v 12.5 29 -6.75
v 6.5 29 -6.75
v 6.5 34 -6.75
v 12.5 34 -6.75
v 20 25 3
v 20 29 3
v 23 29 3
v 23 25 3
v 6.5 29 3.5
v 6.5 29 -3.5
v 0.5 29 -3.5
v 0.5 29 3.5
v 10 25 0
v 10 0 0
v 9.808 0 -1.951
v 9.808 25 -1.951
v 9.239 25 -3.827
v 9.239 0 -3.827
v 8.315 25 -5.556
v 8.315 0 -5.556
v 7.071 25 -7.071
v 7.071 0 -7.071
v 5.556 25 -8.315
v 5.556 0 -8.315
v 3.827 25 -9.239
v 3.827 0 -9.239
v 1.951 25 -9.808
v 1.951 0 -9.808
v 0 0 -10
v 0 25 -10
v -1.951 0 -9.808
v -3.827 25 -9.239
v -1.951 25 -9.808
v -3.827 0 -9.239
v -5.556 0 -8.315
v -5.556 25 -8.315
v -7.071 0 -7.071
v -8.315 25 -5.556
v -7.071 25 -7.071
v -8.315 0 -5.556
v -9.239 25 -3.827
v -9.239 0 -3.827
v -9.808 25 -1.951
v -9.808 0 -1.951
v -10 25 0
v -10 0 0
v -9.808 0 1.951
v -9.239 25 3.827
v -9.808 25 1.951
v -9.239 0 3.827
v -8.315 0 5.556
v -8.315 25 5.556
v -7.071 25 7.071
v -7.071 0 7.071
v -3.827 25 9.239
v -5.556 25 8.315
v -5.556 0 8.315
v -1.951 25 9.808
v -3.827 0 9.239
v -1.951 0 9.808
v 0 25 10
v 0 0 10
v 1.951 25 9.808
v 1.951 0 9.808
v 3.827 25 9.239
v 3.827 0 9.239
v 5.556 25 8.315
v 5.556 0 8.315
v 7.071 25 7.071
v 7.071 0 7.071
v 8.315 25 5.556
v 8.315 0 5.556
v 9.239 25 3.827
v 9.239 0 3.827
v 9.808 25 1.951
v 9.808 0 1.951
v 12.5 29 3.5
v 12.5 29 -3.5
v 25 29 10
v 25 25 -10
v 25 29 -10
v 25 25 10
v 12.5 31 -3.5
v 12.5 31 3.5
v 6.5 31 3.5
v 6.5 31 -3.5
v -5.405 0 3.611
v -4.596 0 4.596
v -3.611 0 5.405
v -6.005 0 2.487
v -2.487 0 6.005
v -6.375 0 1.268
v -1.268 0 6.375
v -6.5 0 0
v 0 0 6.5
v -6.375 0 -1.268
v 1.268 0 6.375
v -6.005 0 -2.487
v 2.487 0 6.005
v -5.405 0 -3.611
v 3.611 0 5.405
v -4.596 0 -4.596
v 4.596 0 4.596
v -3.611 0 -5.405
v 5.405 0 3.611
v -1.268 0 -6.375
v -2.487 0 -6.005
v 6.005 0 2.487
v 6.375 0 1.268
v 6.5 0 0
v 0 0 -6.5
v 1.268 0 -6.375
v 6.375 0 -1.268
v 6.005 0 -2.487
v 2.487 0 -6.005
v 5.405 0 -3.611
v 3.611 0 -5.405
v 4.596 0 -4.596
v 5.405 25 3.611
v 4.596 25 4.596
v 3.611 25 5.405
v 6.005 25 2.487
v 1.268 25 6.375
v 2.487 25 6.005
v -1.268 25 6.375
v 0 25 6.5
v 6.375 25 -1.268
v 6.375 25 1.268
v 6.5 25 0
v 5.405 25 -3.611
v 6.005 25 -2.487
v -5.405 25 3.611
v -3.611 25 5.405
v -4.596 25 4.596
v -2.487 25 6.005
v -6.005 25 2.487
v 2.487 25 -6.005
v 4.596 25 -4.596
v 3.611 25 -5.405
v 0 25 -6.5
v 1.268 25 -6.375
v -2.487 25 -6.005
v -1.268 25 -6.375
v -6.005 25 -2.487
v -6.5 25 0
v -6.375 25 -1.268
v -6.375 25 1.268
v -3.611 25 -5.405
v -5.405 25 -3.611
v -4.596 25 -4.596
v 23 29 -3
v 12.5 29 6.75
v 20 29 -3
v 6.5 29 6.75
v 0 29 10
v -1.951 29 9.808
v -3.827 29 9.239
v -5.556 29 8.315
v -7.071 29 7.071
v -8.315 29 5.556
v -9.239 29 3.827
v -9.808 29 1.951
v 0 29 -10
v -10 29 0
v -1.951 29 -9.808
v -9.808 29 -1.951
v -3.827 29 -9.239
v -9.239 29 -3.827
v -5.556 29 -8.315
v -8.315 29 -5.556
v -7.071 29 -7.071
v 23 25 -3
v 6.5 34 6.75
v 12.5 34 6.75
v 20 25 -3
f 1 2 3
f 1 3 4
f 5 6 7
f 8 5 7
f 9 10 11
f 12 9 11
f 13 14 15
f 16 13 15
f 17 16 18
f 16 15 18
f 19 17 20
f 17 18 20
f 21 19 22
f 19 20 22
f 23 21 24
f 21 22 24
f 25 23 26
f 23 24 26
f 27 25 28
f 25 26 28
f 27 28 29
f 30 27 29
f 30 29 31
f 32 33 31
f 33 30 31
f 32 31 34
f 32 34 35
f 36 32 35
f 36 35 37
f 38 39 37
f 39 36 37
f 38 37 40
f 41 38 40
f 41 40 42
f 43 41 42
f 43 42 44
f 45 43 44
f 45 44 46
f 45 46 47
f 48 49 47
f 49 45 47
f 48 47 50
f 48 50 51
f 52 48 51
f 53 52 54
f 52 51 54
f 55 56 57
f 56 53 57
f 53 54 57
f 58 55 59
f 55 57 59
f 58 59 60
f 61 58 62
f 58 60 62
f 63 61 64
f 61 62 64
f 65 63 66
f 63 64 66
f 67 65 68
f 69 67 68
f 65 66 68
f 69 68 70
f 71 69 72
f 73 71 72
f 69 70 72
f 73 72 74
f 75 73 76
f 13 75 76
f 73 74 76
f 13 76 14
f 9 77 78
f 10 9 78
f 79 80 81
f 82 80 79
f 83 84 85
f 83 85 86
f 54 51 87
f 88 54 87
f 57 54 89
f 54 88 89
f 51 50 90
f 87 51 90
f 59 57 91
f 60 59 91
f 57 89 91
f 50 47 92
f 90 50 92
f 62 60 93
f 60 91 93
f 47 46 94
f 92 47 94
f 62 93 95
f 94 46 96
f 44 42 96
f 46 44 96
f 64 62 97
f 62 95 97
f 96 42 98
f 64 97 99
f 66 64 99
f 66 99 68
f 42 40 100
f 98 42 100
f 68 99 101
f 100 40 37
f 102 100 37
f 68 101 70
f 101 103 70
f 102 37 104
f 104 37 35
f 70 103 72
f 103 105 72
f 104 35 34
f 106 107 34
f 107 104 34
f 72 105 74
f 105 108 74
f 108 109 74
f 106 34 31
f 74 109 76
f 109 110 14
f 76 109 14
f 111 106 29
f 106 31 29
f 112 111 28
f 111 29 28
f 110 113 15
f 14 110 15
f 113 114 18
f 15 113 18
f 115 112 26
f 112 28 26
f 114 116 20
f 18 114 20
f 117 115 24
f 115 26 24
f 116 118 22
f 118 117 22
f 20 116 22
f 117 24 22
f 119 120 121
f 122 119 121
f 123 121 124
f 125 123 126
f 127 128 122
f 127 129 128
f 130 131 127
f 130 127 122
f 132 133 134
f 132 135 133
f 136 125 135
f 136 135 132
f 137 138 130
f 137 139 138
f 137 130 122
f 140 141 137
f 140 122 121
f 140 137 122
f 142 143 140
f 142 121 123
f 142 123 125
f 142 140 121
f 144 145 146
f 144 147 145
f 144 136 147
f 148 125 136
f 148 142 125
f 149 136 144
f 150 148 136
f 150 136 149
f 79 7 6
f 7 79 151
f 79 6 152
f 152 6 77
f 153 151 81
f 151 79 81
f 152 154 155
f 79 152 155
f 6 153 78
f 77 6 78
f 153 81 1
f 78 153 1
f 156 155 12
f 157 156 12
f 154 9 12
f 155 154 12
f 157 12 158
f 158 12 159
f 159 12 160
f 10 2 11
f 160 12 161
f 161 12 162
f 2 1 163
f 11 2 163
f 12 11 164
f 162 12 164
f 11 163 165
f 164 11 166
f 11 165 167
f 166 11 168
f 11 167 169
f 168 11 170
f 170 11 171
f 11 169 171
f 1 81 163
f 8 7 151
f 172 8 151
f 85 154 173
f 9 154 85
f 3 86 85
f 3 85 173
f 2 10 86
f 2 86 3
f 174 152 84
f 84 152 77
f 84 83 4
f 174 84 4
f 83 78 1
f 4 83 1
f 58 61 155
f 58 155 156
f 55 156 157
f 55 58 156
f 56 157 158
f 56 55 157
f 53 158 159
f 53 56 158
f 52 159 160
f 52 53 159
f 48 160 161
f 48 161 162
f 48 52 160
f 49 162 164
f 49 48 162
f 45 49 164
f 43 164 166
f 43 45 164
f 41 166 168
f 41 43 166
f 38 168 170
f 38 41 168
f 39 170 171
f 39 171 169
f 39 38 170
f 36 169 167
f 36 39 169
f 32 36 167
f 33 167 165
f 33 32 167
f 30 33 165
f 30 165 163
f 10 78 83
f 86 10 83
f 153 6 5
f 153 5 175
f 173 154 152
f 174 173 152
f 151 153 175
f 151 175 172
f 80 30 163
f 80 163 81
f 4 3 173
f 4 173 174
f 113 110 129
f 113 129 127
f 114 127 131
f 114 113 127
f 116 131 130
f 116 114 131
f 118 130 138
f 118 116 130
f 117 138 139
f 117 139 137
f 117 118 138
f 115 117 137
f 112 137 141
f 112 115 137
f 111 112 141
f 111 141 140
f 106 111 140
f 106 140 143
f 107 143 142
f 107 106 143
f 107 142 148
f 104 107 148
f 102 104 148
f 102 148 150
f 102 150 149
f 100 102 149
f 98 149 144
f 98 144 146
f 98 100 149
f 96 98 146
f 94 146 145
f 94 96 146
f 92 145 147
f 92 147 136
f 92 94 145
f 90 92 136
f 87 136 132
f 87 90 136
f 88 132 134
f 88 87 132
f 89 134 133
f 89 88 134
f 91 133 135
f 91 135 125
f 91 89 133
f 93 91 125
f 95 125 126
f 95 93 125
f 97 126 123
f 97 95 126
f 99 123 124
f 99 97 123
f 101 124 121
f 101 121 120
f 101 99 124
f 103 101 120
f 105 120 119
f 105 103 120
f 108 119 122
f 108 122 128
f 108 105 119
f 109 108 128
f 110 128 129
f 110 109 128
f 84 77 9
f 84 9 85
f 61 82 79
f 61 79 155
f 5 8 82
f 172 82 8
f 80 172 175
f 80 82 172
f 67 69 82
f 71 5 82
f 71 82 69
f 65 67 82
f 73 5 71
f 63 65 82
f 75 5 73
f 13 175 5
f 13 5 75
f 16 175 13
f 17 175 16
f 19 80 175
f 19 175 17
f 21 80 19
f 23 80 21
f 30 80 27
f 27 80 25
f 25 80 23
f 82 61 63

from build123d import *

# Parameters (mm, degrees)
SKETCH1_R           = 10
SKETCH1_R_2         = 6.5
BOSS_EXTRUDE1_DEPTH = 25
BOSS_EXTRUDE2_DEPTH = 4
SKETCH3_W           = 6
SKETCH3_H           = 13.5
BOSS_EXTRUDE3_DEPTH = 5
SKETCH4_W           = 7
SKETCH4_H           = 2
CUT_EXTRUDE1_DEPTH  = 12
SKETCH5_W           = 3
SKETCH5_H           = 6
CUT_EXTRUDE2_DEPTH  = 12


with BuildPart() as part:
    # Sketch1 → Boss-Extrude1 (new body)
    with BuildSketch(Plane(origin=(0, 0, 0), x_dir=(1, 0, 0), z_dir=(0, 1, 0))):
        Circle(SKETCH1_R)
        Circle(SKETCH1_R_2, mode=Mode.SUBTRACT)
    extrude(amount=BOSS_EXTRUDE1_DEPTH)

    # Sketch2 → Boss-Extrude2 (add)
    with BuildSketch(Plane(origin=(0, 25, 0), x_dir=(1, 0, 0), z_dir=(0, 1, 0))):
        with BuildLine():
            Line((0, 10), (25, 10))
            Line((25, 10), (25, -10))
            Line((25, -10), (0, -10))
            ThreePointArc((0, -10), (-10, 0), (0, 10))
        make_face()
    extrude(amount=BOSS_EXTRUDE2_DEPTH)

    # Sketch3 → Boss-Extrude3 (add)
    with BuildSketch(Plane(origin=(0, 29, 0), x_dir=(1, 0, 0), z_dir=(0, 1, 0))):
        with Locations((9.5, 0)):
            Rectangle(SKETCH3_W, SKETCH3_H)
    extrude(amount=BOSS_EXTRUDE3_DEPTH)

    # Sketch4 → Cut-Extrude1 (cut)
    with BuildSketch(Plane(origin=(12.5, 0, 0), x_dir=(0, 0, -1), z_dir=(1, 0, 0))):
        with Locations((0, 30)):
            Rectangle(SKETCH4_W, SKETCH4_H)
    extrude(amount=-CUT_EXTRUDE1_DEPTH, mode=Mode.SUBTRACT)

    # Sketch5 → Cut-Extrude2 (cut)
    with BuildSketch(Plane(origin=(0, 29, 0), x_dir=(1, 0, 0), z_dir=(0, 1, 0))):
        with Locations((21.5, 0)):
            Rectangle(SKETCH5_W, SKETCH5_H)
    extrude(amount=-CUT_EXTRUDE2_DEPTH, mode=Mode.SUBTRACT)


solid = part.part
